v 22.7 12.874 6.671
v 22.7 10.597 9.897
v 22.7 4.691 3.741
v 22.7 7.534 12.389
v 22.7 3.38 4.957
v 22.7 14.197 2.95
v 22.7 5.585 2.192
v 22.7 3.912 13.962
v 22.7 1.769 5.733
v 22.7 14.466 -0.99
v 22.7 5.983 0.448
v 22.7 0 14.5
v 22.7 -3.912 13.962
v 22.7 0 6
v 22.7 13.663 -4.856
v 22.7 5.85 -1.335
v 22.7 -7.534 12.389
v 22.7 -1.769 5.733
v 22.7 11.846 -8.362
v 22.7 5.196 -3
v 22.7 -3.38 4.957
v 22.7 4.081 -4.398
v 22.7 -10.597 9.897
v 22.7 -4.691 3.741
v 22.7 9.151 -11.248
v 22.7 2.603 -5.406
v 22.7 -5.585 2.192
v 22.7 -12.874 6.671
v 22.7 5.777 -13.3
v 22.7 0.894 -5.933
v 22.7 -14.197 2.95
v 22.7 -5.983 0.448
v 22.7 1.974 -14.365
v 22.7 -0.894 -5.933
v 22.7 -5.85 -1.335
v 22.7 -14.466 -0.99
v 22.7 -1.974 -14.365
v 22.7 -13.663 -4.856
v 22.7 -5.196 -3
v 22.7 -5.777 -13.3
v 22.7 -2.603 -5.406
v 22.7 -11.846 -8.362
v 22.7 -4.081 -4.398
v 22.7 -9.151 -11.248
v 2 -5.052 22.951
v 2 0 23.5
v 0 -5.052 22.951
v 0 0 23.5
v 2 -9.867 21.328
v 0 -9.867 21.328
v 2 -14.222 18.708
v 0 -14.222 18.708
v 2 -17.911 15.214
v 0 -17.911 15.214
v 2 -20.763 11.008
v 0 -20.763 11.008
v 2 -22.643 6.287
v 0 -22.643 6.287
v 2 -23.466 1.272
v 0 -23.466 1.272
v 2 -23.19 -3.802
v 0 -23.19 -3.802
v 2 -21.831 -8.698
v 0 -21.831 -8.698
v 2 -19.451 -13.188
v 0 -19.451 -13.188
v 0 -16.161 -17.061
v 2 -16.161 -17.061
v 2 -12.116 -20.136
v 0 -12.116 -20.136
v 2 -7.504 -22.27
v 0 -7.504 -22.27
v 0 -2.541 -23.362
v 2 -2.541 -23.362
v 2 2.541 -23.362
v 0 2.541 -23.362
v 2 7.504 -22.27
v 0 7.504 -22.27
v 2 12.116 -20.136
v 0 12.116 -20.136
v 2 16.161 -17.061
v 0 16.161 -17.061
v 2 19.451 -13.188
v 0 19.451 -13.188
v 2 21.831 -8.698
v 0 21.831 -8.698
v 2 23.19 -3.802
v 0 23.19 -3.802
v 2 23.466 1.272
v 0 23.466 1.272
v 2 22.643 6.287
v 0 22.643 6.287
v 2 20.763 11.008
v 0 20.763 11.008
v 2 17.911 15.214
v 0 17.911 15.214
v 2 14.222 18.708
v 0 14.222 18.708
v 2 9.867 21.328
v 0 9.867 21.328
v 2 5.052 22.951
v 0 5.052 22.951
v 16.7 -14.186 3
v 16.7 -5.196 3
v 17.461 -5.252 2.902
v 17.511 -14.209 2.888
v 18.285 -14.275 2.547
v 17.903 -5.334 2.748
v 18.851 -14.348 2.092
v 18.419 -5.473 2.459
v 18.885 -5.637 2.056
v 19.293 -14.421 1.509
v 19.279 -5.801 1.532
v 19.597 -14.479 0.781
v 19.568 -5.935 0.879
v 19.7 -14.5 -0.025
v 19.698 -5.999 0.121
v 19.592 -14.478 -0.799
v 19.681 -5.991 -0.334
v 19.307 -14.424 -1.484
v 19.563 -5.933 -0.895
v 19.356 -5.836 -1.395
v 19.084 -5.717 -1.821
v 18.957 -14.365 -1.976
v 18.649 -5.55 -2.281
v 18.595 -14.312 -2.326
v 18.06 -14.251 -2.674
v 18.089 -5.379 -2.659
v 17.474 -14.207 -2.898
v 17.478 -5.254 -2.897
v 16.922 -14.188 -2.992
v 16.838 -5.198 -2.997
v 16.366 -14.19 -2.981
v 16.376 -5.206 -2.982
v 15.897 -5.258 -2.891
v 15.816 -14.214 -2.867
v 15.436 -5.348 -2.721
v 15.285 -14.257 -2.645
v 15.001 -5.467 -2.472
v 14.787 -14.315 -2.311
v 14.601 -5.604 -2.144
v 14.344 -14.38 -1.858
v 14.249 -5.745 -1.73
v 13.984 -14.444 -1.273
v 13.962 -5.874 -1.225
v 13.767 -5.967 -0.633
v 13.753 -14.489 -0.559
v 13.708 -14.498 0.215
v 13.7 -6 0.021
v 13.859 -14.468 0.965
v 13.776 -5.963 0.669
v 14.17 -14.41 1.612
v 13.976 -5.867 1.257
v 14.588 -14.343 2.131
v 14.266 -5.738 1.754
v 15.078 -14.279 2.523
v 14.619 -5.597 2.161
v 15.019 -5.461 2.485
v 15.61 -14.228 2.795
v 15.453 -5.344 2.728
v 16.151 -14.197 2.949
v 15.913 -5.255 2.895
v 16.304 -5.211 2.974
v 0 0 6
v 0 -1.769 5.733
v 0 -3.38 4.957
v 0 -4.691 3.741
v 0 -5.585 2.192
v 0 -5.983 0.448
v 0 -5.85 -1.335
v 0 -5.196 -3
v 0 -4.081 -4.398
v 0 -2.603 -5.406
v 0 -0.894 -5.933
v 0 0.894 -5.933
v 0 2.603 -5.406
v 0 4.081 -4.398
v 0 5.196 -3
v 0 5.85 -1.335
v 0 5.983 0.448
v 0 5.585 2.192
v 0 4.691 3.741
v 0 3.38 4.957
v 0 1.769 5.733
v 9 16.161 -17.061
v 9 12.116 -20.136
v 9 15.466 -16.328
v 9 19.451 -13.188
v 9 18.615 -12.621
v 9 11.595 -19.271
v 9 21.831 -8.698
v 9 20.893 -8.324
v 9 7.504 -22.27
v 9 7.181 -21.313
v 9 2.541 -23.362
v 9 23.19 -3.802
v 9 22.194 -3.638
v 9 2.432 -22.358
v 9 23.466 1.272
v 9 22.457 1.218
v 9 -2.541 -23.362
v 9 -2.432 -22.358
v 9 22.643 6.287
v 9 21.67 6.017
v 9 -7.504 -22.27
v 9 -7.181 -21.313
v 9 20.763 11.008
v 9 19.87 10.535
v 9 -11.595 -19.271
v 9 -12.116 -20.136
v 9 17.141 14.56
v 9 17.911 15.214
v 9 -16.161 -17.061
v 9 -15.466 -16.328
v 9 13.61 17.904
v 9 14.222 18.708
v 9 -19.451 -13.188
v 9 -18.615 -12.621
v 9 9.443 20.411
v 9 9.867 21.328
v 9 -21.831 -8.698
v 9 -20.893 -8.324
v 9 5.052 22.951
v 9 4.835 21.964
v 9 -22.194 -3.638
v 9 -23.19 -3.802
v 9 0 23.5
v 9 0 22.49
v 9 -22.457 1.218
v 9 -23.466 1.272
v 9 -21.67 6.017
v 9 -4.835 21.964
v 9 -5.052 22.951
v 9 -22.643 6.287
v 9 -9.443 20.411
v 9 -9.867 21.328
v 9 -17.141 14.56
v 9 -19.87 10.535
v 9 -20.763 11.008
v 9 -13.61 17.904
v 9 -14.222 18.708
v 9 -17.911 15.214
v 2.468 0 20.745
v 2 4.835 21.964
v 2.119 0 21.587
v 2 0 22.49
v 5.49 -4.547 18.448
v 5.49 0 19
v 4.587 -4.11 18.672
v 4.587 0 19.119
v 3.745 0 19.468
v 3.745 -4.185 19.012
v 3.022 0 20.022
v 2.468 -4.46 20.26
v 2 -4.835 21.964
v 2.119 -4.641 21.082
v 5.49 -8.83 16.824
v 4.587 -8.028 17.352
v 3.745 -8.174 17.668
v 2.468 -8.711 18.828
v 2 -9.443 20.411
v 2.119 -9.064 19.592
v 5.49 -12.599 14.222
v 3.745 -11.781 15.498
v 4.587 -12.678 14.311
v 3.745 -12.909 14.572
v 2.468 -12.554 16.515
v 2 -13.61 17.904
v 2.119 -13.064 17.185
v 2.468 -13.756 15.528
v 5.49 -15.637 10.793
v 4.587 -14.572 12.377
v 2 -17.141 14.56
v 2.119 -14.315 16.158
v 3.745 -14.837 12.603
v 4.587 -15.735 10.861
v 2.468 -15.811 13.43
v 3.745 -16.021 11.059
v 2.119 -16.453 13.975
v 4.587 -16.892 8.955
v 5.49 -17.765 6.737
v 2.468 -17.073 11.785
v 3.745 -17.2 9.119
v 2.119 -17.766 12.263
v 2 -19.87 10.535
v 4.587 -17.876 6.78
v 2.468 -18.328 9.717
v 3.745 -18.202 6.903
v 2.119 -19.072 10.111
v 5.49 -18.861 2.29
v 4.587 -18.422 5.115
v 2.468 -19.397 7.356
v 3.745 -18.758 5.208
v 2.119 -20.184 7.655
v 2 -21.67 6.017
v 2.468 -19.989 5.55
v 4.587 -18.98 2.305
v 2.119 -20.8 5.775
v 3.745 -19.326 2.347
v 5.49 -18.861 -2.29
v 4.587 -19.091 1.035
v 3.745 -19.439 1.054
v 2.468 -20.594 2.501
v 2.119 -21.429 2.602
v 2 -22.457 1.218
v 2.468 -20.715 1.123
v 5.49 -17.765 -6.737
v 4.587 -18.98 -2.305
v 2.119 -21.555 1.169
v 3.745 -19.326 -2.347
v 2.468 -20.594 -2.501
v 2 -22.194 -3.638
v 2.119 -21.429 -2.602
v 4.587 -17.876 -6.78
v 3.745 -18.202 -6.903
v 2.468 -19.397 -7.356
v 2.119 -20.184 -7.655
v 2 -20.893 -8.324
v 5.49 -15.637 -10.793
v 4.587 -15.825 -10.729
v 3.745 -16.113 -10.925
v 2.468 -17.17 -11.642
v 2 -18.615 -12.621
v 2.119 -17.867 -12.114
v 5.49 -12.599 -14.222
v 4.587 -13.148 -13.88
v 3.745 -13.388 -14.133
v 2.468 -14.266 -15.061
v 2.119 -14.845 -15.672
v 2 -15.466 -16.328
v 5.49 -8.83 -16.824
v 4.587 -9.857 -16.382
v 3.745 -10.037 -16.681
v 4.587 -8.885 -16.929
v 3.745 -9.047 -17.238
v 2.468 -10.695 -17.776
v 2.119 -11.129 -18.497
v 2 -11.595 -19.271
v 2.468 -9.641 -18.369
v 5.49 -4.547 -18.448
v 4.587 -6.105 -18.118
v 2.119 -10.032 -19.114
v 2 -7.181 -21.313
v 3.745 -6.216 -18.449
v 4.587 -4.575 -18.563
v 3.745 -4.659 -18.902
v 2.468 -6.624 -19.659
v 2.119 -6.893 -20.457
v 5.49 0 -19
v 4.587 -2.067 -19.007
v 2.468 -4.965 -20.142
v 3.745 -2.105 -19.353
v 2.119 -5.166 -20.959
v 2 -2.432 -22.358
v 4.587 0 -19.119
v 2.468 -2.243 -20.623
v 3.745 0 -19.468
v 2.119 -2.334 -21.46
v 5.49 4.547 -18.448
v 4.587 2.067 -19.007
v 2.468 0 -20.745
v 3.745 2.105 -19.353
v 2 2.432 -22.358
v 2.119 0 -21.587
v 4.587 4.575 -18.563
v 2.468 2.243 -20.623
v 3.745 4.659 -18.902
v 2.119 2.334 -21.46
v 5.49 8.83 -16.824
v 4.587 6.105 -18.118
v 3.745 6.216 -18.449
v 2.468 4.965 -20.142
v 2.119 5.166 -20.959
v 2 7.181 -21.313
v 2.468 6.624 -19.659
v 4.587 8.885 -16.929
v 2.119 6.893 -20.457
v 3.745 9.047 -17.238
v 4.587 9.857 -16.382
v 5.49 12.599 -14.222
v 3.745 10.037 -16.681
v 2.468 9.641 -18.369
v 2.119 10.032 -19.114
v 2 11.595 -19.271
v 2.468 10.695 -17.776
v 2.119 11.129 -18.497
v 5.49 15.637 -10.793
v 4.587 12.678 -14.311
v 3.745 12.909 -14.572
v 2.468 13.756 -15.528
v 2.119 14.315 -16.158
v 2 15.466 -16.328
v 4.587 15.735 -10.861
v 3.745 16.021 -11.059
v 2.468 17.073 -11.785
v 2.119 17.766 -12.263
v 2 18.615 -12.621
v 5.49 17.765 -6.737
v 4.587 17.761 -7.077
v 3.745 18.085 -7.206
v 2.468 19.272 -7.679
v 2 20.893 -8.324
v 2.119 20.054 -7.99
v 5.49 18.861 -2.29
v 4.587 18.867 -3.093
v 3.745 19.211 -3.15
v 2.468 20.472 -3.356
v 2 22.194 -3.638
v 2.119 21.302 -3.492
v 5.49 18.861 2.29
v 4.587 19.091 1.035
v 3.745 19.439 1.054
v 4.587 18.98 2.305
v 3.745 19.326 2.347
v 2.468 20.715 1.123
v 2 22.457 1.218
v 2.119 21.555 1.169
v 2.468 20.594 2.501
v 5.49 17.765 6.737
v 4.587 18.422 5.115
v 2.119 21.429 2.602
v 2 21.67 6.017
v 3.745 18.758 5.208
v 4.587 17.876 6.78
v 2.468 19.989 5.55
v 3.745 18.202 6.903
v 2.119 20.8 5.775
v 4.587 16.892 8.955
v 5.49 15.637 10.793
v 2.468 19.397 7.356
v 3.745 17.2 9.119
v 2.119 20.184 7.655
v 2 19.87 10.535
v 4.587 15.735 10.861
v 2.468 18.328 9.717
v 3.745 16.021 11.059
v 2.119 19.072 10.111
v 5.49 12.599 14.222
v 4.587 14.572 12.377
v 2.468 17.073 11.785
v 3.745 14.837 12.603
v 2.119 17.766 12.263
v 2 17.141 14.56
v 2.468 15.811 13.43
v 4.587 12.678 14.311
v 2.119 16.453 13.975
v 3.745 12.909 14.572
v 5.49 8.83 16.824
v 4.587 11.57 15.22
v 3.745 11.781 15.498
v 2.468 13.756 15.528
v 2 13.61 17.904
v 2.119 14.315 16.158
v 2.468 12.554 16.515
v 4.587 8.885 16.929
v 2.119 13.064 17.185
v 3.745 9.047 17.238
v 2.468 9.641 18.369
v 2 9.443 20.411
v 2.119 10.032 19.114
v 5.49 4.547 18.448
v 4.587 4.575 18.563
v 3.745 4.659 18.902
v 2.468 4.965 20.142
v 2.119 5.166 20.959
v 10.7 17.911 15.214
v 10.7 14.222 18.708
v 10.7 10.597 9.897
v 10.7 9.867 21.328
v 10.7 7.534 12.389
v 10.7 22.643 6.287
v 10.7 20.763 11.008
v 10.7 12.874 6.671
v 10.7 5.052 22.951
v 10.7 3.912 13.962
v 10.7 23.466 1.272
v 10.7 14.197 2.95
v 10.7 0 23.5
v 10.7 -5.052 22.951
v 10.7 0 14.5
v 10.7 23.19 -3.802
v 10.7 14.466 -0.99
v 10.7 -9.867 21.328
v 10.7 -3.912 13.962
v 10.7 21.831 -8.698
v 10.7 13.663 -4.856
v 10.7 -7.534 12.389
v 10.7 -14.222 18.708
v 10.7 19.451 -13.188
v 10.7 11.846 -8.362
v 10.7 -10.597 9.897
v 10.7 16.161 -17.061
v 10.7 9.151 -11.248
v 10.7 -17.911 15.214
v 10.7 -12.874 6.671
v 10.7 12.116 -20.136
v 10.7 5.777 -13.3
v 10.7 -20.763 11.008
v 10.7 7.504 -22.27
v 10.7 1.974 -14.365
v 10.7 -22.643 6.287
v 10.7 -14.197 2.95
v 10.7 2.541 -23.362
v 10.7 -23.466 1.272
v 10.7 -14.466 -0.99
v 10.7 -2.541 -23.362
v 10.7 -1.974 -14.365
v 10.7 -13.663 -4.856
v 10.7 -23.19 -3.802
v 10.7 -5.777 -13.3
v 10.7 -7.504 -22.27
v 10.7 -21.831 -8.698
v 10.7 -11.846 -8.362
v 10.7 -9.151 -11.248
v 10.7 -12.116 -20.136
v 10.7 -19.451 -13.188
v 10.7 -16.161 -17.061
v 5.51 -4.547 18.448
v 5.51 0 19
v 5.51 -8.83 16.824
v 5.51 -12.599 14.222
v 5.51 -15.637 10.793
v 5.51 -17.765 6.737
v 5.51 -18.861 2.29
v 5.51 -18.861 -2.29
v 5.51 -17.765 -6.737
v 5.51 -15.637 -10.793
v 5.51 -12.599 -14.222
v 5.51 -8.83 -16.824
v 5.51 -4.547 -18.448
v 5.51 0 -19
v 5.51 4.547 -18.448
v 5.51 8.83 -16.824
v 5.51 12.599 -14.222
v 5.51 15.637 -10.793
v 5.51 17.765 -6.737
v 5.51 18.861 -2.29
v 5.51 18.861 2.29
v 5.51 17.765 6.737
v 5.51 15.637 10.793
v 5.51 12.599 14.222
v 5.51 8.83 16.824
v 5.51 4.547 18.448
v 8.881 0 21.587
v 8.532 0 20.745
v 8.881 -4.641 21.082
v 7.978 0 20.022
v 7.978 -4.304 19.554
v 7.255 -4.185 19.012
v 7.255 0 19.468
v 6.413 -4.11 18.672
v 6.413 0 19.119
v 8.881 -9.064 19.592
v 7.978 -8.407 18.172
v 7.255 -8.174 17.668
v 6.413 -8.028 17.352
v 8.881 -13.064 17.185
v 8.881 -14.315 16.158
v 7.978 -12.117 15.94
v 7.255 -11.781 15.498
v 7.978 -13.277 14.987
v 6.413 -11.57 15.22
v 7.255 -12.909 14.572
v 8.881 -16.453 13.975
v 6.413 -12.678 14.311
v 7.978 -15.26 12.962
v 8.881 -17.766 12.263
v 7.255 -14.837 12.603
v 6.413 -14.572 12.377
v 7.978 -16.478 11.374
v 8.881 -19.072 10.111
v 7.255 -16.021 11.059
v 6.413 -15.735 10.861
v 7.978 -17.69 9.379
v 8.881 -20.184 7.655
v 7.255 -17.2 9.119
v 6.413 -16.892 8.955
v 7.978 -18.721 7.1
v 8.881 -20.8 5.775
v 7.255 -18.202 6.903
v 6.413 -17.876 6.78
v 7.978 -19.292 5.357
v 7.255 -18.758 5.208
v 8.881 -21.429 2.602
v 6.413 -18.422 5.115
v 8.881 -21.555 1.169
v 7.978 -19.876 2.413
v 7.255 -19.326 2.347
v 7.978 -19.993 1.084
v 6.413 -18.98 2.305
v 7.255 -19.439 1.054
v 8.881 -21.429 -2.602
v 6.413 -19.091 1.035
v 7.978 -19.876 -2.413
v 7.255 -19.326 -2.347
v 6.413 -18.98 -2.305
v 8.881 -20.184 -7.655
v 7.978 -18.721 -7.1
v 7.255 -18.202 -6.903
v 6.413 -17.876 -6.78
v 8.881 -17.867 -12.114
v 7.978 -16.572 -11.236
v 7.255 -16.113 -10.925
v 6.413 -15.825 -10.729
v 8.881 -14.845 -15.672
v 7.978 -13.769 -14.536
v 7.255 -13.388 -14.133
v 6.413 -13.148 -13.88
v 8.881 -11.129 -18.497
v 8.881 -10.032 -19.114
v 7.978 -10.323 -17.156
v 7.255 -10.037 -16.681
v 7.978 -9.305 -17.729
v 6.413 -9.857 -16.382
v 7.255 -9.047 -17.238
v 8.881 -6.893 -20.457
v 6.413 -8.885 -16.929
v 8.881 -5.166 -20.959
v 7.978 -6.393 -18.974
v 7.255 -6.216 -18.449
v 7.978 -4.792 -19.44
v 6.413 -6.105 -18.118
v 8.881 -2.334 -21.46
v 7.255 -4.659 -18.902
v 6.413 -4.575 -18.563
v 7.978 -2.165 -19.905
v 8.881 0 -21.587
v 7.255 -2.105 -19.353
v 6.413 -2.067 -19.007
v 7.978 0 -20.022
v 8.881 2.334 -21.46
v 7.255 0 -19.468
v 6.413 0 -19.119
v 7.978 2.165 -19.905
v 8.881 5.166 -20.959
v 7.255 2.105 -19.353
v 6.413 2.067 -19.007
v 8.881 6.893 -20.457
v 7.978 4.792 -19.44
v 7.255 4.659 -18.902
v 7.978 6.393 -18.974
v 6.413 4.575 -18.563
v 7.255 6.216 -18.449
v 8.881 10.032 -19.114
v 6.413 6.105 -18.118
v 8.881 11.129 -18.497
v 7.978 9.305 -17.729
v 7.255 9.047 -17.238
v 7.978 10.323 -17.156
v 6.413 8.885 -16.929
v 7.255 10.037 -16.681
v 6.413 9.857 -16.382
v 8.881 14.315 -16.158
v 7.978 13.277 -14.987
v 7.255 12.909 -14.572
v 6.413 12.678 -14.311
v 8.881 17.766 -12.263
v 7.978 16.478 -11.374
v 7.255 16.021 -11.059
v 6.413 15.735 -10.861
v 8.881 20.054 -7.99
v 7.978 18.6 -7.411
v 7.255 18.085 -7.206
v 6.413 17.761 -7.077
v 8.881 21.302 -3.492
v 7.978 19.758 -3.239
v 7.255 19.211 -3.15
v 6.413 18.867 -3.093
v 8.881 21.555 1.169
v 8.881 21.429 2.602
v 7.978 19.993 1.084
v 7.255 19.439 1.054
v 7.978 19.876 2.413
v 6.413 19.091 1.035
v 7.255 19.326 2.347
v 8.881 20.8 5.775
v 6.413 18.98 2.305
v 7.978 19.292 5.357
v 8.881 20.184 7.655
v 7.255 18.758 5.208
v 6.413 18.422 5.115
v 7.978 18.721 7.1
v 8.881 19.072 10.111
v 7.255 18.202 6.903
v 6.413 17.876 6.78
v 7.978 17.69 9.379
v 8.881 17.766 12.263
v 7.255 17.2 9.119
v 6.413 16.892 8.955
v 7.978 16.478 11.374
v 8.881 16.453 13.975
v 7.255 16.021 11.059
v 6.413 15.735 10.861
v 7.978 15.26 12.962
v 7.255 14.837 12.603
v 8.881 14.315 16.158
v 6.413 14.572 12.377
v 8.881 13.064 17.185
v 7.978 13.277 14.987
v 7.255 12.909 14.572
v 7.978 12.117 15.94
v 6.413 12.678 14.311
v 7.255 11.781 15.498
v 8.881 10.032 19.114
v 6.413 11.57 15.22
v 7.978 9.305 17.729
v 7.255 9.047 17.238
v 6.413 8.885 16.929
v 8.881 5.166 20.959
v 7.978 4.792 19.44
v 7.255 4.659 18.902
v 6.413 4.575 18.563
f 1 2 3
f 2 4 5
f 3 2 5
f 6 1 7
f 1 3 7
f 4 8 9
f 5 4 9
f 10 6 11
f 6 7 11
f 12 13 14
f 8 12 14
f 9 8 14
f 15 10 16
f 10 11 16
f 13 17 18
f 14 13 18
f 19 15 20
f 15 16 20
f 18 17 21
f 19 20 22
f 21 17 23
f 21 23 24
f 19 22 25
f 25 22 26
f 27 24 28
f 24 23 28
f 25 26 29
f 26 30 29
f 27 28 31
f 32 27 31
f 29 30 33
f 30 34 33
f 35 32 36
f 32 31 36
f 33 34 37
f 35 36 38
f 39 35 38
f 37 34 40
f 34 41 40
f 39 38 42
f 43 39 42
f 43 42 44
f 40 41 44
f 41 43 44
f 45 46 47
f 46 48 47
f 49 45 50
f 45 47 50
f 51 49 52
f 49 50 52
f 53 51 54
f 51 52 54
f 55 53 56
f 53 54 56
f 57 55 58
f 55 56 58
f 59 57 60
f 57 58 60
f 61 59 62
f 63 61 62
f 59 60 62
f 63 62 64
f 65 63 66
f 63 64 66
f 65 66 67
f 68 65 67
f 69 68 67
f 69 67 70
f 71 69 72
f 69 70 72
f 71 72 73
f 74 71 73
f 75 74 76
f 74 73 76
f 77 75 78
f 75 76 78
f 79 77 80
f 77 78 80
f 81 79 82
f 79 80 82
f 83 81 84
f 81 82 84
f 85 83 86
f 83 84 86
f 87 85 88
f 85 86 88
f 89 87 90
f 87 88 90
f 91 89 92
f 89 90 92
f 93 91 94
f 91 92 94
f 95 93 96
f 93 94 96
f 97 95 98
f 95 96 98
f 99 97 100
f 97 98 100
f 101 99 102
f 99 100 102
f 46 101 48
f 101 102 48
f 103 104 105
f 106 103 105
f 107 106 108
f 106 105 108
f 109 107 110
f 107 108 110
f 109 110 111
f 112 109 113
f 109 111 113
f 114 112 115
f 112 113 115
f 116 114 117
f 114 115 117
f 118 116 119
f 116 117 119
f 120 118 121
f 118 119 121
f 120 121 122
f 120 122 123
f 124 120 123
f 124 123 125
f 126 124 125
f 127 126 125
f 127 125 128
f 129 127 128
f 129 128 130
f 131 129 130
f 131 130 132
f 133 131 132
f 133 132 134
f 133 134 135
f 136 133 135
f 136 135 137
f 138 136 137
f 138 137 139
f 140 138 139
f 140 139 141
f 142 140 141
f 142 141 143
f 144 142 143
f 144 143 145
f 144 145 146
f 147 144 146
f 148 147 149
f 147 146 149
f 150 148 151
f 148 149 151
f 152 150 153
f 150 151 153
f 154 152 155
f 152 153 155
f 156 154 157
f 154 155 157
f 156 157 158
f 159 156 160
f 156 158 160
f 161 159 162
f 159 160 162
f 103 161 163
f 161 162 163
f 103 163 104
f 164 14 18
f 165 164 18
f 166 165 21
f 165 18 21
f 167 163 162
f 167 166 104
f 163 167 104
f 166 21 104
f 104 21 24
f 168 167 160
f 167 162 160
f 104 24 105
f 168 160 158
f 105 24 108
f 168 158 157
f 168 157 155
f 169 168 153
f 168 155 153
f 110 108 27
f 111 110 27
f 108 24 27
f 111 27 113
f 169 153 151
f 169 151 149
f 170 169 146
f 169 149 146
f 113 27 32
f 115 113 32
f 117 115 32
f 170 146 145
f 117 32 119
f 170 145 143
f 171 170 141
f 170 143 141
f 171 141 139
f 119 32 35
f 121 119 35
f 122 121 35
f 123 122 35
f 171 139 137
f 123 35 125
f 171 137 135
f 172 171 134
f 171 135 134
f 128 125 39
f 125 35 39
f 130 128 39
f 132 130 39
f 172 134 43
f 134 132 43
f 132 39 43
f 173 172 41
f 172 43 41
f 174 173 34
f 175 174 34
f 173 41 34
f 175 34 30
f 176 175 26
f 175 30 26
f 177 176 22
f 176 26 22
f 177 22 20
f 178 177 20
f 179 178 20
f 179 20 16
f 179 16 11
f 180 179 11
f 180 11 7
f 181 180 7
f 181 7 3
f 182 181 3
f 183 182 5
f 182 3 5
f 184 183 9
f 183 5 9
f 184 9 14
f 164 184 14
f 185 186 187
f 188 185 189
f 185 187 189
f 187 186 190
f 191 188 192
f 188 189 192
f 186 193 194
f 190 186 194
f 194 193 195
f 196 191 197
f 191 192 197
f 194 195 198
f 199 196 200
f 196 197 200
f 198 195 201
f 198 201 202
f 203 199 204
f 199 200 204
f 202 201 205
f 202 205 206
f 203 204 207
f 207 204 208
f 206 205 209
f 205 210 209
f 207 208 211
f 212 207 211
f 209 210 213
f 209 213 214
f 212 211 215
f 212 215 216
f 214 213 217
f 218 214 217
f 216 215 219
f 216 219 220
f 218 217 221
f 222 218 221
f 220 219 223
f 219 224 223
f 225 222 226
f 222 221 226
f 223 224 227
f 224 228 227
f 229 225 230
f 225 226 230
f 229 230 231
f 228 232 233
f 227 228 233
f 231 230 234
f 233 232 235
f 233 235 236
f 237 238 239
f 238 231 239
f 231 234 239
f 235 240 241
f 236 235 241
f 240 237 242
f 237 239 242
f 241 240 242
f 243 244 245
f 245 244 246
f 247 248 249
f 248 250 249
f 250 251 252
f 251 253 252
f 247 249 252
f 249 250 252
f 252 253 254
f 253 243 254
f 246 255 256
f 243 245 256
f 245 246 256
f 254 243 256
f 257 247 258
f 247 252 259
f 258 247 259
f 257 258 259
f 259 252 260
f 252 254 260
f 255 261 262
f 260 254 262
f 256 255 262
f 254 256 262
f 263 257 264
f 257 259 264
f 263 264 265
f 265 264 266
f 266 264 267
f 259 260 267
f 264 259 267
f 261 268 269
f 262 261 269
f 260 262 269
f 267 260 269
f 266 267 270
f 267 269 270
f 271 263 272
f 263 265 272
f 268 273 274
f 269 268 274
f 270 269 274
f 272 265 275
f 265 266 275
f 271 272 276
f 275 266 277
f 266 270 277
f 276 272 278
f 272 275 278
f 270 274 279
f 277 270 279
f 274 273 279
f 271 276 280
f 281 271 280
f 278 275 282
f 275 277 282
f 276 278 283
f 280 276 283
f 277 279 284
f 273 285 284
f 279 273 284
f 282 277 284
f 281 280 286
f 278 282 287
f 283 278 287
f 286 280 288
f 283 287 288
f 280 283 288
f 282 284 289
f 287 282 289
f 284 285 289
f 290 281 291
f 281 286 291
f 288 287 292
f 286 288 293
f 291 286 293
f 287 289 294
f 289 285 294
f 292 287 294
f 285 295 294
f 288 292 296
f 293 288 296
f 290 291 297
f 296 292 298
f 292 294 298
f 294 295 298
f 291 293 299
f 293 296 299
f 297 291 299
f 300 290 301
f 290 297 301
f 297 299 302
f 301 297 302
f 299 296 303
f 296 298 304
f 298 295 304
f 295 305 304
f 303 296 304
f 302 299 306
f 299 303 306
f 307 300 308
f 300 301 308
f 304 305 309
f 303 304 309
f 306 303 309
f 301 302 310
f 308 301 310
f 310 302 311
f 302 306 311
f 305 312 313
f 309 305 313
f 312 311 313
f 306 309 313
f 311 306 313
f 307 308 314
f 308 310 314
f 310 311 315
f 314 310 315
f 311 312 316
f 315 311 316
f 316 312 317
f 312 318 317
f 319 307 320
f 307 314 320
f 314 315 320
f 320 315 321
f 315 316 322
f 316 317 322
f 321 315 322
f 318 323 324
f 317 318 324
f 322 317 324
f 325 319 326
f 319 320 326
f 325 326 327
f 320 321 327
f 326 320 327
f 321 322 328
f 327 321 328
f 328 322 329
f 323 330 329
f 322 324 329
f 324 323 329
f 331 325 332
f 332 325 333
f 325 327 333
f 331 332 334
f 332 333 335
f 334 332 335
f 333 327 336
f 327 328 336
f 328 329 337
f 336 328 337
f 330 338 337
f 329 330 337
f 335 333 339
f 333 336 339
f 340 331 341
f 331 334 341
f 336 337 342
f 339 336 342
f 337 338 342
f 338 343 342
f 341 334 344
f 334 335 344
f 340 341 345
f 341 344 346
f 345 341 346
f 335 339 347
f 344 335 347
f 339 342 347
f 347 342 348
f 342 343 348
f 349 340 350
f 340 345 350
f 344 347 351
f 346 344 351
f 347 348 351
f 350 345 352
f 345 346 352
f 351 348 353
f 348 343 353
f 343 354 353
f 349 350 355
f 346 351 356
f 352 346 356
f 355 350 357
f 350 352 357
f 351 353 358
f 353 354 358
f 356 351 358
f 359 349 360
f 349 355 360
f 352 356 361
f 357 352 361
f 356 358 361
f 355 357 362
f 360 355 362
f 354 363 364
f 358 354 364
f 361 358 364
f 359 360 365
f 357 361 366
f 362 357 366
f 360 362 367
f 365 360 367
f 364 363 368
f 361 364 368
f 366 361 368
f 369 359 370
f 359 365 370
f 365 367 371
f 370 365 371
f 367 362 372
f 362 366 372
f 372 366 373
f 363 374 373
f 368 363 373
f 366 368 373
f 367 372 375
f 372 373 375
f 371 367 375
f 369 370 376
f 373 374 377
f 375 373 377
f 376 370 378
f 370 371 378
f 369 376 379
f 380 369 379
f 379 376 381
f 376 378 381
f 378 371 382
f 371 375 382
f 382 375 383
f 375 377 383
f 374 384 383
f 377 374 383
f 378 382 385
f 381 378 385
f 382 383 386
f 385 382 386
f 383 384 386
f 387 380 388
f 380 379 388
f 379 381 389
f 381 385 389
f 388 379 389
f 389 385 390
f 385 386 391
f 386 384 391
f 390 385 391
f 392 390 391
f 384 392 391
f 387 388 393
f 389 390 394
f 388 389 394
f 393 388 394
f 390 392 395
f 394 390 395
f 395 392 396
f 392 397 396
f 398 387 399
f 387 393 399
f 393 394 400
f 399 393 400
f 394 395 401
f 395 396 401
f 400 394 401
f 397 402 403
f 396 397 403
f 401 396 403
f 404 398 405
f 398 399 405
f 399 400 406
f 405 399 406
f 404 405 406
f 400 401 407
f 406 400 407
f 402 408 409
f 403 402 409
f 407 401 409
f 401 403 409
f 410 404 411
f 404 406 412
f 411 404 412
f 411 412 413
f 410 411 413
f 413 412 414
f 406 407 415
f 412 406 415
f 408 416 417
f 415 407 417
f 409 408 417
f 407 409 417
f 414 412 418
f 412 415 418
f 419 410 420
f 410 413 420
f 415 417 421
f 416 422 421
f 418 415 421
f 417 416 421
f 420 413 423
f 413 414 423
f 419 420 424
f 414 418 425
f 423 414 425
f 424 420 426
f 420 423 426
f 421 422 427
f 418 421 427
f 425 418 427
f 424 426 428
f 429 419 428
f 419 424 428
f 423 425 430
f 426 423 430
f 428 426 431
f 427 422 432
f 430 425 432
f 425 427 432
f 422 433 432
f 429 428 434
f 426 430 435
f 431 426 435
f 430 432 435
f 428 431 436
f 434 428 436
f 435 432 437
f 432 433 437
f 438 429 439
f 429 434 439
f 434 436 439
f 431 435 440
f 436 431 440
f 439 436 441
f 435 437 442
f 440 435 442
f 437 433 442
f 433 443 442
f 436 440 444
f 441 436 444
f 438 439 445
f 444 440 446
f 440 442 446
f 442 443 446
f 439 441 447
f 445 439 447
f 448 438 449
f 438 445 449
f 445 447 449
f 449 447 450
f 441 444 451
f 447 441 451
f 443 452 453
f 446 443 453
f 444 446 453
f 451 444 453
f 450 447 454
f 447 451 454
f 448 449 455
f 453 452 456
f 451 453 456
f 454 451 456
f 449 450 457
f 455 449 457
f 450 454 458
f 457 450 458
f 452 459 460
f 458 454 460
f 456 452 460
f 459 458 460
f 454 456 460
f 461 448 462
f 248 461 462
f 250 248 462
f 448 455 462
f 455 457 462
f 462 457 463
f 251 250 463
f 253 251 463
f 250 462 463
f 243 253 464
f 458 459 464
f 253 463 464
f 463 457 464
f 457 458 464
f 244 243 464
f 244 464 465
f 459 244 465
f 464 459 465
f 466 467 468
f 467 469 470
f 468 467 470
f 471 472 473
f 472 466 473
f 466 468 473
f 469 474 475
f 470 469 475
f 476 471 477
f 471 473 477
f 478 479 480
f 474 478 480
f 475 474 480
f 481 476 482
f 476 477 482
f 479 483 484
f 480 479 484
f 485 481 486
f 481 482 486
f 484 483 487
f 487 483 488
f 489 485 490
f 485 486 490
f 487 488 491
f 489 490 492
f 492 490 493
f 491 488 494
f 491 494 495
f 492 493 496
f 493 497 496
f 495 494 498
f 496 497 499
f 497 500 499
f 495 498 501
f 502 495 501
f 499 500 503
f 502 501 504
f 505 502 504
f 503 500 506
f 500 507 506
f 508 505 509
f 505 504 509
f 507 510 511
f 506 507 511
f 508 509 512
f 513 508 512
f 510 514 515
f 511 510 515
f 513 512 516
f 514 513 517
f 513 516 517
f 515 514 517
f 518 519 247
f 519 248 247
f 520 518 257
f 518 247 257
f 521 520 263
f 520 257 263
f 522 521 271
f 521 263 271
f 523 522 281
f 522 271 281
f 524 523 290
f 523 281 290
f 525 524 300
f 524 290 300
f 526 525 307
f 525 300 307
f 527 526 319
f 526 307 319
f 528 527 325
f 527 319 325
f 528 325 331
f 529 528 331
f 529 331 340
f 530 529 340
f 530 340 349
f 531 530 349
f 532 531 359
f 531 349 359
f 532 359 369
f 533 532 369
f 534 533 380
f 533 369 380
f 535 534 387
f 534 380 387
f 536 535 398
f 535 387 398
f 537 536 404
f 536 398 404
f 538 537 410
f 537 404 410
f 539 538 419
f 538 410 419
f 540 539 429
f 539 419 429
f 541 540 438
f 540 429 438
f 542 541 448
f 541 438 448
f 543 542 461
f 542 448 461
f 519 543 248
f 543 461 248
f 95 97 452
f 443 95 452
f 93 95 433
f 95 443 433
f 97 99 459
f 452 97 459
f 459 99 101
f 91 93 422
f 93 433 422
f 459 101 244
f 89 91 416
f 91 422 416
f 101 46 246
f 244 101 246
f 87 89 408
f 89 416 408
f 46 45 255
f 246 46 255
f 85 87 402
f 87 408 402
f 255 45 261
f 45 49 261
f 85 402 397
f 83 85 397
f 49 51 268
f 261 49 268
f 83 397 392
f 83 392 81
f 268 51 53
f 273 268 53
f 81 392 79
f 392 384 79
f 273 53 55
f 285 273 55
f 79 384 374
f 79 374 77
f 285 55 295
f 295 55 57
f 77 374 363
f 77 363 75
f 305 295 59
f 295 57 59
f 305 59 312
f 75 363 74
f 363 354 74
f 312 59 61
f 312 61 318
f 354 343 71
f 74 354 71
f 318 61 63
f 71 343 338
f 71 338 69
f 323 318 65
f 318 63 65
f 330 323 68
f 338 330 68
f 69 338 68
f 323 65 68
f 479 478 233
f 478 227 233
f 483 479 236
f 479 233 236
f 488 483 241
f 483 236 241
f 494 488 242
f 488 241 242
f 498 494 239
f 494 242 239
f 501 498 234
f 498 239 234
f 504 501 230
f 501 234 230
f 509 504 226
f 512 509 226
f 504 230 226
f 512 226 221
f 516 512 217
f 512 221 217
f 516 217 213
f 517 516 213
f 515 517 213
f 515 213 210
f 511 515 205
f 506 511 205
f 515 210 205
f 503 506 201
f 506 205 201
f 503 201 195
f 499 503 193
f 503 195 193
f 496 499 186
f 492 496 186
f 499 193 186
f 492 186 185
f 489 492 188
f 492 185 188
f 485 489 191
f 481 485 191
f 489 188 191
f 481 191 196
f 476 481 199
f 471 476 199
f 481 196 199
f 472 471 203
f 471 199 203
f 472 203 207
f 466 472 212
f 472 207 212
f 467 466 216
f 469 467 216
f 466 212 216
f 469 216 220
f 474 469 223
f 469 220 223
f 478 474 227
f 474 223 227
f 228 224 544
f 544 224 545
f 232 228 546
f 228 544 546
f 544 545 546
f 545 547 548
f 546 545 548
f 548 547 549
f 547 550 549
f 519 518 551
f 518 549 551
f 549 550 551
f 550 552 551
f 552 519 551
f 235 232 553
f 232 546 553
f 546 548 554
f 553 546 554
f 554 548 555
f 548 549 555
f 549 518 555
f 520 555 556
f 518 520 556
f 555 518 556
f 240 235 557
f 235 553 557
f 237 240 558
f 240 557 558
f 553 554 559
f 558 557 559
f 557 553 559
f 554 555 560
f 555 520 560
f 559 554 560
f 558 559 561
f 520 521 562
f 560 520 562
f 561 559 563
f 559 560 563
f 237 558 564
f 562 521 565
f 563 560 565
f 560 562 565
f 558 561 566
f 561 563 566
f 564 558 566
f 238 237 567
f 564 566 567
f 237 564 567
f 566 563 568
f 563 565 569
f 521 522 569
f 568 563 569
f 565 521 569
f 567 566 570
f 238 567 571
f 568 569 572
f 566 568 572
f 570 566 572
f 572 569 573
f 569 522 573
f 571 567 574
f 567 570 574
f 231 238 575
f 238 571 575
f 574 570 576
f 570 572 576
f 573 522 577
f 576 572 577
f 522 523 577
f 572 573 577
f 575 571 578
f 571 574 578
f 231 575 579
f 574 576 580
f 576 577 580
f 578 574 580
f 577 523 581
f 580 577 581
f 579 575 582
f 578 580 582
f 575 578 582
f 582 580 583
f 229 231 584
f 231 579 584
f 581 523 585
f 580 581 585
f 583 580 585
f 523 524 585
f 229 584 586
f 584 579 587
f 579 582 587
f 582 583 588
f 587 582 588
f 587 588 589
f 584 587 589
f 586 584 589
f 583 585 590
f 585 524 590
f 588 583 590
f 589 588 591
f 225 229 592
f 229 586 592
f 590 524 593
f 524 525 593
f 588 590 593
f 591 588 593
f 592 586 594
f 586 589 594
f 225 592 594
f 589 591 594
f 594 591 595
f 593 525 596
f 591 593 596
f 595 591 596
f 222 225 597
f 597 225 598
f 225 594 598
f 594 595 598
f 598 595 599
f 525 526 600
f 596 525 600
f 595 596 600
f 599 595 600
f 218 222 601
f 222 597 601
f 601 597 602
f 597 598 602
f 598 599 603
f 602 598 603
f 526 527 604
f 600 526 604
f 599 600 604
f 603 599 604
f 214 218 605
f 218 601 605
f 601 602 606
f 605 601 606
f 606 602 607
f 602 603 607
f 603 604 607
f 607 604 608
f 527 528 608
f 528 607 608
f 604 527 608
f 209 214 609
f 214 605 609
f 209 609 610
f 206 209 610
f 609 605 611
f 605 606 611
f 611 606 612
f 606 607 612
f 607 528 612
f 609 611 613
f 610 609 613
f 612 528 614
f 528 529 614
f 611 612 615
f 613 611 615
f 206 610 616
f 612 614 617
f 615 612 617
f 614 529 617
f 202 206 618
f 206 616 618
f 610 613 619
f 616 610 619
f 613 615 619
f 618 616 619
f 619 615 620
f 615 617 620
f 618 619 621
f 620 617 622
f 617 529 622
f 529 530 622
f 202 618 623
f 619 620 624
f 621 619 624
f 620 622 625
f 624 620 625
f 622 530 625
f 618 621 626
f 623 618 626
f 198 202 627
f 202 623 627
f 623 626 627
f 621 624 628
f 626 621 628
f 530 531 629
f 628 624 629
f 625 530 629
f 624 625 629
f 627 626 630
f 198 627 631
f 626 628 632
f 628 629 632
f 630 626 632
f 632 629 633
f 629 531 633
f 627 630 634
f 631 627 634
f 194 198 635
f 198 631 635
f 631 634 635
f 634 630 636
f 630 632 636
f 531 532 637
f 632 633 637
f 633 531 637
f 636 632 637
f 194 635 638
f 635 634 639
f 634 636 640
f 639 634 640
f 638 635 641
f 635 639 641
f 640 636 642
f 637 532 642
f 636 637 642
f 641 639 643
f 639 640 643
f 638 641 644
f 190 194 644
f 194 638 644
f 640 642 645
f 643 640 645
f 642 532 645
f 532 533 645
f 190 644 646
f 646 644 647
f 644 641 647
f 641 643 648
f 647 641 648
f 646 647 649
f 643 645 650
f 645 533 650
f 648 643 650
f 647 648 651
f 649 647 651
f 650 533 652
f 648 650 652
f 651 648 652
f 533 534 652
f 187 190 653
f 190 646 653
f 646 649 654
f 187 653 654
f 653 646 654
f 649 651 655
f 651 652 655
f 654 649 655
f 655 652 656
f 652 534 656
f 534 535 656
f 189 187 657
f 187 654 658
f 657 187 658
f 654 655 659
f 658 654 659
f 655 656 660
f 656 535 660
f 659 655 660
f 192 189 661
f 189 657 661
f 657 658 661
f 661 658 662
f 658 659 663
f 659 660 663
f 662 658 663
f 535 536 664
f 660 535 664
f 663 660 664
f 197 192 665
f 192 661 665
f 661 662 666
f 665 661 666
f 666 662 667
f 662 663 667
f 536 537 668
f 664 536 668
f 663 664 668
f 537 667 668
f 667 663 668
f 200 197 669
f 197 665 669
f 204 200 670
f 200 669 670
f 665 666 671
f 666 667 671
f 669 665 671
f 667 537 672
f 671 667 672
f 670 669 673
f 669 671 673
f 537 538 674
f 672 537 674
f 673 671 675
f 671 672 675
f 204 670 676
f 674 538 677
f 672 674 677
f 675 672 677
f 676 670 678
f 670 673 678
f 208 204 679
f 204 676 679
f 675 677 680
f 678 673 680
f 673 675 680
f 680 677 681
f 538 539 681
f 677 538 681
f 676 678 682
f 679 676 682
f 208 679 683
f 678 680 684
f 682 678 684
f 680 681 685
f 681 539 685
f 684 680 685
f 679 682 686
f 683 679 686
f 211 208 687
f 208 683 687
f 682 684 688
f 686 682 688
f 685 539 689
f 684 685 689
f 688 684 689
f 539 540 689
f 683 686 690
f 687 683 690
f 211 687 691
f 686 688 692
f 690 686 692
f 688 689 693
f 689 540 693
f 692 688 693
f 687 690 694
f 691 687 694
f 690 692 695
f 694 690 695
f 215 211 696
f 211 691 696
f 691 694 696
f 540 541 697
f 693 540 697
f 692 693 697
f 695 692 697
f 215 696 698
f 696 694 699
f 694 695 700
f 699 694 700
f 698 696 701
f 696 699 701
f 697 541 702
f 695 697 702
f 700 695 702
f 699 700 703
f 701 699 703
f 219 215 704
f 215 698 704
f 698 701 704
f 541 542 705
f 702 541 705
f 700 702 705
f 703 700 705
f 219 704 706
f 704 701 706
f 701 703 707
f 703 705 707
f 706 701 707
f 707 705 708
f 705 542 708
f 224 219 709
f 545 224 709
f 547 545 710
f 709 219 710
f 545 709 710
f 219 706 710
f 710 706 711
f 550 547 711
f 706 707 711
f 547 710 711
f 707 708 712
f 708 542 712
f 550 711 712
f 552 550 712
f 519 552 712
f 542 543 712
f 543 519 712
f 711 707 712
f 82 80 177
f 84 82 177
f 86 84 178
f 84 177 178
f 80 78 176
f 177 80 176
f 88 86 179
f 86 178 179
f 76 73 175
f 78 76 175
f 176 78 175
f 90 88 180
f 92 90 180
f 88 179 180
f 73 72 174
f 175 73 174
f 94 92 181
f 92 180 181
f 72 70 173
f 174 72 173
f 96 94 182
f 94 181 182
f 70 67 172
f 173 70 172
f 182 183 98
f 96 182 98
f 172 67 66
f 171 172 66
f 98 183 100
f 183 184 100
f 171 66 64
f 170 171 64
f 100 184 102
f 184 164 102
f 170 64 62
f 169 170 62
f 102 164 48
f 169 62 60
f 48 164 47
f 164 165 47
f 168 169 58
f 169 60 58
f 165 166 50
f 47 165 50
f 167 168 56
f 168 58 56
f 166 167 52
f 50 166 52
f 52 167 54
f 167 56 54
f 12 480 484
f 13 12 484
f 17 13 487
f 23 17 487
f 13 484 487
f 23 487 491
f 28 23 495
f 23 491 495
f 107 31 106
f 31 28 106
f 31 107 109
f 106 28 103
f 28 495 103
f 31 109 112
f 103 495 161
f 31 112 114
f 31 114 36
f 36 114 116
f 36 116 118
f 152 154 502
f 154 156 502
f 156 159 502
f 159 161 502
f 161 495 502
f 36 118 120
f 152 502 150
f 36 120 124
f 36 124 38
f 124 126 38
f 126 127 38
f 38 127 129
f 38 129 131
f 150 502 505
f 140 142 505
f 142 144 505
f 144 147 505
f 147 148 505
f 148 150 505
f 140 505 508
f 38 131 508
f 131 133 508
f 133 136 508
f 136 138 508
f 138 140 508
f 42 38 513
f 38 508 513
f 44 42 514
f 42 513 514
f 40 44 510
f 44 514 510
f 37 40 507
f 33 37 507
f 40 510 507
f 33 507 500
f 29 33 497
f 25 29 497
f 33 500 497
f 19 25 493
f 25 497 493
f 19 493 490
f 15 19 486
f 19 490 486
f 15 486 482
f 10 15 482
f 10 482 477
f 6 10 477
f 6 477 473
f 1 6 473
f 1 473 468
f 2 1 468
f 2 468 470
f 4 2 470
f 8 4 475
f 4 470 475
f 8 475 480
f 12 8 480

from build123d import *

# Parameters (mm, degrees)
CUT_EXTRUDE_1_REACH      = 42.247
CUT_EXTRUDE_1_END_RADIUS = 14.5
SKETCH_2_R               = 3


with BuildPart() as part:
    # Sketch 259 → Повернуть1 (revolve)
    with BuildSketch(Plane.XY, mode=Mode.PRIVATE) as revolve_1_sk:
        with BuildLine():
            Line((0, 6), (22.7, 6))
            Line((22.7, 6), (22.7, 14.5))
            Line((22.7, 14.5), (10.7, 14.5))
            Line((10.7, 14.5), (10.7, 23.5))
            Line((10.7, 23.5), (9, 23.5))
            Line((9, 23.5), (9, 22.49))
            ThreePointArc((9, 22.49), (7.977802666, 20.022197334), (5.51, 19))
            Line((5.51, 19), (5.49, 19))
            ThreePointArc((5.49, 19), (3.022197334, 20.022197334), (2, 22.49))
            Line((2, 22.49), (2, 23.5))
            Line((2, 23.5), (0, 23.5))
            Line((0, 23.5), (0, 6))
        make_face()
    revolve(revolve_1_sk.sketch.rotate(Axis((0, 0, 0), (1, 0, 0)), 90), axis=Axis((0, 0, 0), (1, 0, 0)))

    # Вырез-Вытянуть1: up to this cylinder (the profile starts inside it)
    cut_extrude_1_end = Plane(origin=(16.7, 0, 0), z_dir=(-1, 0, 0)) * Cylinder(CUT_EXTRUDE_1_END_RADIUS, 114.494, mode=Mode.PRIVATE)
    # Эскиз2 → Вырез-Вытянуть1 (cut, up to the surface)
    with BuildSketch(Plane(origin=(0, 0, 0), x_dir=(1, 0, 0), z_dir=(0, 1, 0)), mode=Mode.PRIVATE) as cut_extrude_1_sk1:
        with Locations(Location((16.7, 0, 0), (0, 0, 270))):
            Circle(SKETCH_2_R)
    cut_extrude_1_tool1 = extrude(cut_extrude_1_sk1.sketch, amount=-CUT_EXTRUDE_1_REACH, mode=Mode.PRIVATE) & cut_extrude_1_end
    add(cut_extrude_1_tool1.solids().sort_by_distance((16.7, 0, 0))[0], mode=Mode.SUBTRACT)


solid = part.part
